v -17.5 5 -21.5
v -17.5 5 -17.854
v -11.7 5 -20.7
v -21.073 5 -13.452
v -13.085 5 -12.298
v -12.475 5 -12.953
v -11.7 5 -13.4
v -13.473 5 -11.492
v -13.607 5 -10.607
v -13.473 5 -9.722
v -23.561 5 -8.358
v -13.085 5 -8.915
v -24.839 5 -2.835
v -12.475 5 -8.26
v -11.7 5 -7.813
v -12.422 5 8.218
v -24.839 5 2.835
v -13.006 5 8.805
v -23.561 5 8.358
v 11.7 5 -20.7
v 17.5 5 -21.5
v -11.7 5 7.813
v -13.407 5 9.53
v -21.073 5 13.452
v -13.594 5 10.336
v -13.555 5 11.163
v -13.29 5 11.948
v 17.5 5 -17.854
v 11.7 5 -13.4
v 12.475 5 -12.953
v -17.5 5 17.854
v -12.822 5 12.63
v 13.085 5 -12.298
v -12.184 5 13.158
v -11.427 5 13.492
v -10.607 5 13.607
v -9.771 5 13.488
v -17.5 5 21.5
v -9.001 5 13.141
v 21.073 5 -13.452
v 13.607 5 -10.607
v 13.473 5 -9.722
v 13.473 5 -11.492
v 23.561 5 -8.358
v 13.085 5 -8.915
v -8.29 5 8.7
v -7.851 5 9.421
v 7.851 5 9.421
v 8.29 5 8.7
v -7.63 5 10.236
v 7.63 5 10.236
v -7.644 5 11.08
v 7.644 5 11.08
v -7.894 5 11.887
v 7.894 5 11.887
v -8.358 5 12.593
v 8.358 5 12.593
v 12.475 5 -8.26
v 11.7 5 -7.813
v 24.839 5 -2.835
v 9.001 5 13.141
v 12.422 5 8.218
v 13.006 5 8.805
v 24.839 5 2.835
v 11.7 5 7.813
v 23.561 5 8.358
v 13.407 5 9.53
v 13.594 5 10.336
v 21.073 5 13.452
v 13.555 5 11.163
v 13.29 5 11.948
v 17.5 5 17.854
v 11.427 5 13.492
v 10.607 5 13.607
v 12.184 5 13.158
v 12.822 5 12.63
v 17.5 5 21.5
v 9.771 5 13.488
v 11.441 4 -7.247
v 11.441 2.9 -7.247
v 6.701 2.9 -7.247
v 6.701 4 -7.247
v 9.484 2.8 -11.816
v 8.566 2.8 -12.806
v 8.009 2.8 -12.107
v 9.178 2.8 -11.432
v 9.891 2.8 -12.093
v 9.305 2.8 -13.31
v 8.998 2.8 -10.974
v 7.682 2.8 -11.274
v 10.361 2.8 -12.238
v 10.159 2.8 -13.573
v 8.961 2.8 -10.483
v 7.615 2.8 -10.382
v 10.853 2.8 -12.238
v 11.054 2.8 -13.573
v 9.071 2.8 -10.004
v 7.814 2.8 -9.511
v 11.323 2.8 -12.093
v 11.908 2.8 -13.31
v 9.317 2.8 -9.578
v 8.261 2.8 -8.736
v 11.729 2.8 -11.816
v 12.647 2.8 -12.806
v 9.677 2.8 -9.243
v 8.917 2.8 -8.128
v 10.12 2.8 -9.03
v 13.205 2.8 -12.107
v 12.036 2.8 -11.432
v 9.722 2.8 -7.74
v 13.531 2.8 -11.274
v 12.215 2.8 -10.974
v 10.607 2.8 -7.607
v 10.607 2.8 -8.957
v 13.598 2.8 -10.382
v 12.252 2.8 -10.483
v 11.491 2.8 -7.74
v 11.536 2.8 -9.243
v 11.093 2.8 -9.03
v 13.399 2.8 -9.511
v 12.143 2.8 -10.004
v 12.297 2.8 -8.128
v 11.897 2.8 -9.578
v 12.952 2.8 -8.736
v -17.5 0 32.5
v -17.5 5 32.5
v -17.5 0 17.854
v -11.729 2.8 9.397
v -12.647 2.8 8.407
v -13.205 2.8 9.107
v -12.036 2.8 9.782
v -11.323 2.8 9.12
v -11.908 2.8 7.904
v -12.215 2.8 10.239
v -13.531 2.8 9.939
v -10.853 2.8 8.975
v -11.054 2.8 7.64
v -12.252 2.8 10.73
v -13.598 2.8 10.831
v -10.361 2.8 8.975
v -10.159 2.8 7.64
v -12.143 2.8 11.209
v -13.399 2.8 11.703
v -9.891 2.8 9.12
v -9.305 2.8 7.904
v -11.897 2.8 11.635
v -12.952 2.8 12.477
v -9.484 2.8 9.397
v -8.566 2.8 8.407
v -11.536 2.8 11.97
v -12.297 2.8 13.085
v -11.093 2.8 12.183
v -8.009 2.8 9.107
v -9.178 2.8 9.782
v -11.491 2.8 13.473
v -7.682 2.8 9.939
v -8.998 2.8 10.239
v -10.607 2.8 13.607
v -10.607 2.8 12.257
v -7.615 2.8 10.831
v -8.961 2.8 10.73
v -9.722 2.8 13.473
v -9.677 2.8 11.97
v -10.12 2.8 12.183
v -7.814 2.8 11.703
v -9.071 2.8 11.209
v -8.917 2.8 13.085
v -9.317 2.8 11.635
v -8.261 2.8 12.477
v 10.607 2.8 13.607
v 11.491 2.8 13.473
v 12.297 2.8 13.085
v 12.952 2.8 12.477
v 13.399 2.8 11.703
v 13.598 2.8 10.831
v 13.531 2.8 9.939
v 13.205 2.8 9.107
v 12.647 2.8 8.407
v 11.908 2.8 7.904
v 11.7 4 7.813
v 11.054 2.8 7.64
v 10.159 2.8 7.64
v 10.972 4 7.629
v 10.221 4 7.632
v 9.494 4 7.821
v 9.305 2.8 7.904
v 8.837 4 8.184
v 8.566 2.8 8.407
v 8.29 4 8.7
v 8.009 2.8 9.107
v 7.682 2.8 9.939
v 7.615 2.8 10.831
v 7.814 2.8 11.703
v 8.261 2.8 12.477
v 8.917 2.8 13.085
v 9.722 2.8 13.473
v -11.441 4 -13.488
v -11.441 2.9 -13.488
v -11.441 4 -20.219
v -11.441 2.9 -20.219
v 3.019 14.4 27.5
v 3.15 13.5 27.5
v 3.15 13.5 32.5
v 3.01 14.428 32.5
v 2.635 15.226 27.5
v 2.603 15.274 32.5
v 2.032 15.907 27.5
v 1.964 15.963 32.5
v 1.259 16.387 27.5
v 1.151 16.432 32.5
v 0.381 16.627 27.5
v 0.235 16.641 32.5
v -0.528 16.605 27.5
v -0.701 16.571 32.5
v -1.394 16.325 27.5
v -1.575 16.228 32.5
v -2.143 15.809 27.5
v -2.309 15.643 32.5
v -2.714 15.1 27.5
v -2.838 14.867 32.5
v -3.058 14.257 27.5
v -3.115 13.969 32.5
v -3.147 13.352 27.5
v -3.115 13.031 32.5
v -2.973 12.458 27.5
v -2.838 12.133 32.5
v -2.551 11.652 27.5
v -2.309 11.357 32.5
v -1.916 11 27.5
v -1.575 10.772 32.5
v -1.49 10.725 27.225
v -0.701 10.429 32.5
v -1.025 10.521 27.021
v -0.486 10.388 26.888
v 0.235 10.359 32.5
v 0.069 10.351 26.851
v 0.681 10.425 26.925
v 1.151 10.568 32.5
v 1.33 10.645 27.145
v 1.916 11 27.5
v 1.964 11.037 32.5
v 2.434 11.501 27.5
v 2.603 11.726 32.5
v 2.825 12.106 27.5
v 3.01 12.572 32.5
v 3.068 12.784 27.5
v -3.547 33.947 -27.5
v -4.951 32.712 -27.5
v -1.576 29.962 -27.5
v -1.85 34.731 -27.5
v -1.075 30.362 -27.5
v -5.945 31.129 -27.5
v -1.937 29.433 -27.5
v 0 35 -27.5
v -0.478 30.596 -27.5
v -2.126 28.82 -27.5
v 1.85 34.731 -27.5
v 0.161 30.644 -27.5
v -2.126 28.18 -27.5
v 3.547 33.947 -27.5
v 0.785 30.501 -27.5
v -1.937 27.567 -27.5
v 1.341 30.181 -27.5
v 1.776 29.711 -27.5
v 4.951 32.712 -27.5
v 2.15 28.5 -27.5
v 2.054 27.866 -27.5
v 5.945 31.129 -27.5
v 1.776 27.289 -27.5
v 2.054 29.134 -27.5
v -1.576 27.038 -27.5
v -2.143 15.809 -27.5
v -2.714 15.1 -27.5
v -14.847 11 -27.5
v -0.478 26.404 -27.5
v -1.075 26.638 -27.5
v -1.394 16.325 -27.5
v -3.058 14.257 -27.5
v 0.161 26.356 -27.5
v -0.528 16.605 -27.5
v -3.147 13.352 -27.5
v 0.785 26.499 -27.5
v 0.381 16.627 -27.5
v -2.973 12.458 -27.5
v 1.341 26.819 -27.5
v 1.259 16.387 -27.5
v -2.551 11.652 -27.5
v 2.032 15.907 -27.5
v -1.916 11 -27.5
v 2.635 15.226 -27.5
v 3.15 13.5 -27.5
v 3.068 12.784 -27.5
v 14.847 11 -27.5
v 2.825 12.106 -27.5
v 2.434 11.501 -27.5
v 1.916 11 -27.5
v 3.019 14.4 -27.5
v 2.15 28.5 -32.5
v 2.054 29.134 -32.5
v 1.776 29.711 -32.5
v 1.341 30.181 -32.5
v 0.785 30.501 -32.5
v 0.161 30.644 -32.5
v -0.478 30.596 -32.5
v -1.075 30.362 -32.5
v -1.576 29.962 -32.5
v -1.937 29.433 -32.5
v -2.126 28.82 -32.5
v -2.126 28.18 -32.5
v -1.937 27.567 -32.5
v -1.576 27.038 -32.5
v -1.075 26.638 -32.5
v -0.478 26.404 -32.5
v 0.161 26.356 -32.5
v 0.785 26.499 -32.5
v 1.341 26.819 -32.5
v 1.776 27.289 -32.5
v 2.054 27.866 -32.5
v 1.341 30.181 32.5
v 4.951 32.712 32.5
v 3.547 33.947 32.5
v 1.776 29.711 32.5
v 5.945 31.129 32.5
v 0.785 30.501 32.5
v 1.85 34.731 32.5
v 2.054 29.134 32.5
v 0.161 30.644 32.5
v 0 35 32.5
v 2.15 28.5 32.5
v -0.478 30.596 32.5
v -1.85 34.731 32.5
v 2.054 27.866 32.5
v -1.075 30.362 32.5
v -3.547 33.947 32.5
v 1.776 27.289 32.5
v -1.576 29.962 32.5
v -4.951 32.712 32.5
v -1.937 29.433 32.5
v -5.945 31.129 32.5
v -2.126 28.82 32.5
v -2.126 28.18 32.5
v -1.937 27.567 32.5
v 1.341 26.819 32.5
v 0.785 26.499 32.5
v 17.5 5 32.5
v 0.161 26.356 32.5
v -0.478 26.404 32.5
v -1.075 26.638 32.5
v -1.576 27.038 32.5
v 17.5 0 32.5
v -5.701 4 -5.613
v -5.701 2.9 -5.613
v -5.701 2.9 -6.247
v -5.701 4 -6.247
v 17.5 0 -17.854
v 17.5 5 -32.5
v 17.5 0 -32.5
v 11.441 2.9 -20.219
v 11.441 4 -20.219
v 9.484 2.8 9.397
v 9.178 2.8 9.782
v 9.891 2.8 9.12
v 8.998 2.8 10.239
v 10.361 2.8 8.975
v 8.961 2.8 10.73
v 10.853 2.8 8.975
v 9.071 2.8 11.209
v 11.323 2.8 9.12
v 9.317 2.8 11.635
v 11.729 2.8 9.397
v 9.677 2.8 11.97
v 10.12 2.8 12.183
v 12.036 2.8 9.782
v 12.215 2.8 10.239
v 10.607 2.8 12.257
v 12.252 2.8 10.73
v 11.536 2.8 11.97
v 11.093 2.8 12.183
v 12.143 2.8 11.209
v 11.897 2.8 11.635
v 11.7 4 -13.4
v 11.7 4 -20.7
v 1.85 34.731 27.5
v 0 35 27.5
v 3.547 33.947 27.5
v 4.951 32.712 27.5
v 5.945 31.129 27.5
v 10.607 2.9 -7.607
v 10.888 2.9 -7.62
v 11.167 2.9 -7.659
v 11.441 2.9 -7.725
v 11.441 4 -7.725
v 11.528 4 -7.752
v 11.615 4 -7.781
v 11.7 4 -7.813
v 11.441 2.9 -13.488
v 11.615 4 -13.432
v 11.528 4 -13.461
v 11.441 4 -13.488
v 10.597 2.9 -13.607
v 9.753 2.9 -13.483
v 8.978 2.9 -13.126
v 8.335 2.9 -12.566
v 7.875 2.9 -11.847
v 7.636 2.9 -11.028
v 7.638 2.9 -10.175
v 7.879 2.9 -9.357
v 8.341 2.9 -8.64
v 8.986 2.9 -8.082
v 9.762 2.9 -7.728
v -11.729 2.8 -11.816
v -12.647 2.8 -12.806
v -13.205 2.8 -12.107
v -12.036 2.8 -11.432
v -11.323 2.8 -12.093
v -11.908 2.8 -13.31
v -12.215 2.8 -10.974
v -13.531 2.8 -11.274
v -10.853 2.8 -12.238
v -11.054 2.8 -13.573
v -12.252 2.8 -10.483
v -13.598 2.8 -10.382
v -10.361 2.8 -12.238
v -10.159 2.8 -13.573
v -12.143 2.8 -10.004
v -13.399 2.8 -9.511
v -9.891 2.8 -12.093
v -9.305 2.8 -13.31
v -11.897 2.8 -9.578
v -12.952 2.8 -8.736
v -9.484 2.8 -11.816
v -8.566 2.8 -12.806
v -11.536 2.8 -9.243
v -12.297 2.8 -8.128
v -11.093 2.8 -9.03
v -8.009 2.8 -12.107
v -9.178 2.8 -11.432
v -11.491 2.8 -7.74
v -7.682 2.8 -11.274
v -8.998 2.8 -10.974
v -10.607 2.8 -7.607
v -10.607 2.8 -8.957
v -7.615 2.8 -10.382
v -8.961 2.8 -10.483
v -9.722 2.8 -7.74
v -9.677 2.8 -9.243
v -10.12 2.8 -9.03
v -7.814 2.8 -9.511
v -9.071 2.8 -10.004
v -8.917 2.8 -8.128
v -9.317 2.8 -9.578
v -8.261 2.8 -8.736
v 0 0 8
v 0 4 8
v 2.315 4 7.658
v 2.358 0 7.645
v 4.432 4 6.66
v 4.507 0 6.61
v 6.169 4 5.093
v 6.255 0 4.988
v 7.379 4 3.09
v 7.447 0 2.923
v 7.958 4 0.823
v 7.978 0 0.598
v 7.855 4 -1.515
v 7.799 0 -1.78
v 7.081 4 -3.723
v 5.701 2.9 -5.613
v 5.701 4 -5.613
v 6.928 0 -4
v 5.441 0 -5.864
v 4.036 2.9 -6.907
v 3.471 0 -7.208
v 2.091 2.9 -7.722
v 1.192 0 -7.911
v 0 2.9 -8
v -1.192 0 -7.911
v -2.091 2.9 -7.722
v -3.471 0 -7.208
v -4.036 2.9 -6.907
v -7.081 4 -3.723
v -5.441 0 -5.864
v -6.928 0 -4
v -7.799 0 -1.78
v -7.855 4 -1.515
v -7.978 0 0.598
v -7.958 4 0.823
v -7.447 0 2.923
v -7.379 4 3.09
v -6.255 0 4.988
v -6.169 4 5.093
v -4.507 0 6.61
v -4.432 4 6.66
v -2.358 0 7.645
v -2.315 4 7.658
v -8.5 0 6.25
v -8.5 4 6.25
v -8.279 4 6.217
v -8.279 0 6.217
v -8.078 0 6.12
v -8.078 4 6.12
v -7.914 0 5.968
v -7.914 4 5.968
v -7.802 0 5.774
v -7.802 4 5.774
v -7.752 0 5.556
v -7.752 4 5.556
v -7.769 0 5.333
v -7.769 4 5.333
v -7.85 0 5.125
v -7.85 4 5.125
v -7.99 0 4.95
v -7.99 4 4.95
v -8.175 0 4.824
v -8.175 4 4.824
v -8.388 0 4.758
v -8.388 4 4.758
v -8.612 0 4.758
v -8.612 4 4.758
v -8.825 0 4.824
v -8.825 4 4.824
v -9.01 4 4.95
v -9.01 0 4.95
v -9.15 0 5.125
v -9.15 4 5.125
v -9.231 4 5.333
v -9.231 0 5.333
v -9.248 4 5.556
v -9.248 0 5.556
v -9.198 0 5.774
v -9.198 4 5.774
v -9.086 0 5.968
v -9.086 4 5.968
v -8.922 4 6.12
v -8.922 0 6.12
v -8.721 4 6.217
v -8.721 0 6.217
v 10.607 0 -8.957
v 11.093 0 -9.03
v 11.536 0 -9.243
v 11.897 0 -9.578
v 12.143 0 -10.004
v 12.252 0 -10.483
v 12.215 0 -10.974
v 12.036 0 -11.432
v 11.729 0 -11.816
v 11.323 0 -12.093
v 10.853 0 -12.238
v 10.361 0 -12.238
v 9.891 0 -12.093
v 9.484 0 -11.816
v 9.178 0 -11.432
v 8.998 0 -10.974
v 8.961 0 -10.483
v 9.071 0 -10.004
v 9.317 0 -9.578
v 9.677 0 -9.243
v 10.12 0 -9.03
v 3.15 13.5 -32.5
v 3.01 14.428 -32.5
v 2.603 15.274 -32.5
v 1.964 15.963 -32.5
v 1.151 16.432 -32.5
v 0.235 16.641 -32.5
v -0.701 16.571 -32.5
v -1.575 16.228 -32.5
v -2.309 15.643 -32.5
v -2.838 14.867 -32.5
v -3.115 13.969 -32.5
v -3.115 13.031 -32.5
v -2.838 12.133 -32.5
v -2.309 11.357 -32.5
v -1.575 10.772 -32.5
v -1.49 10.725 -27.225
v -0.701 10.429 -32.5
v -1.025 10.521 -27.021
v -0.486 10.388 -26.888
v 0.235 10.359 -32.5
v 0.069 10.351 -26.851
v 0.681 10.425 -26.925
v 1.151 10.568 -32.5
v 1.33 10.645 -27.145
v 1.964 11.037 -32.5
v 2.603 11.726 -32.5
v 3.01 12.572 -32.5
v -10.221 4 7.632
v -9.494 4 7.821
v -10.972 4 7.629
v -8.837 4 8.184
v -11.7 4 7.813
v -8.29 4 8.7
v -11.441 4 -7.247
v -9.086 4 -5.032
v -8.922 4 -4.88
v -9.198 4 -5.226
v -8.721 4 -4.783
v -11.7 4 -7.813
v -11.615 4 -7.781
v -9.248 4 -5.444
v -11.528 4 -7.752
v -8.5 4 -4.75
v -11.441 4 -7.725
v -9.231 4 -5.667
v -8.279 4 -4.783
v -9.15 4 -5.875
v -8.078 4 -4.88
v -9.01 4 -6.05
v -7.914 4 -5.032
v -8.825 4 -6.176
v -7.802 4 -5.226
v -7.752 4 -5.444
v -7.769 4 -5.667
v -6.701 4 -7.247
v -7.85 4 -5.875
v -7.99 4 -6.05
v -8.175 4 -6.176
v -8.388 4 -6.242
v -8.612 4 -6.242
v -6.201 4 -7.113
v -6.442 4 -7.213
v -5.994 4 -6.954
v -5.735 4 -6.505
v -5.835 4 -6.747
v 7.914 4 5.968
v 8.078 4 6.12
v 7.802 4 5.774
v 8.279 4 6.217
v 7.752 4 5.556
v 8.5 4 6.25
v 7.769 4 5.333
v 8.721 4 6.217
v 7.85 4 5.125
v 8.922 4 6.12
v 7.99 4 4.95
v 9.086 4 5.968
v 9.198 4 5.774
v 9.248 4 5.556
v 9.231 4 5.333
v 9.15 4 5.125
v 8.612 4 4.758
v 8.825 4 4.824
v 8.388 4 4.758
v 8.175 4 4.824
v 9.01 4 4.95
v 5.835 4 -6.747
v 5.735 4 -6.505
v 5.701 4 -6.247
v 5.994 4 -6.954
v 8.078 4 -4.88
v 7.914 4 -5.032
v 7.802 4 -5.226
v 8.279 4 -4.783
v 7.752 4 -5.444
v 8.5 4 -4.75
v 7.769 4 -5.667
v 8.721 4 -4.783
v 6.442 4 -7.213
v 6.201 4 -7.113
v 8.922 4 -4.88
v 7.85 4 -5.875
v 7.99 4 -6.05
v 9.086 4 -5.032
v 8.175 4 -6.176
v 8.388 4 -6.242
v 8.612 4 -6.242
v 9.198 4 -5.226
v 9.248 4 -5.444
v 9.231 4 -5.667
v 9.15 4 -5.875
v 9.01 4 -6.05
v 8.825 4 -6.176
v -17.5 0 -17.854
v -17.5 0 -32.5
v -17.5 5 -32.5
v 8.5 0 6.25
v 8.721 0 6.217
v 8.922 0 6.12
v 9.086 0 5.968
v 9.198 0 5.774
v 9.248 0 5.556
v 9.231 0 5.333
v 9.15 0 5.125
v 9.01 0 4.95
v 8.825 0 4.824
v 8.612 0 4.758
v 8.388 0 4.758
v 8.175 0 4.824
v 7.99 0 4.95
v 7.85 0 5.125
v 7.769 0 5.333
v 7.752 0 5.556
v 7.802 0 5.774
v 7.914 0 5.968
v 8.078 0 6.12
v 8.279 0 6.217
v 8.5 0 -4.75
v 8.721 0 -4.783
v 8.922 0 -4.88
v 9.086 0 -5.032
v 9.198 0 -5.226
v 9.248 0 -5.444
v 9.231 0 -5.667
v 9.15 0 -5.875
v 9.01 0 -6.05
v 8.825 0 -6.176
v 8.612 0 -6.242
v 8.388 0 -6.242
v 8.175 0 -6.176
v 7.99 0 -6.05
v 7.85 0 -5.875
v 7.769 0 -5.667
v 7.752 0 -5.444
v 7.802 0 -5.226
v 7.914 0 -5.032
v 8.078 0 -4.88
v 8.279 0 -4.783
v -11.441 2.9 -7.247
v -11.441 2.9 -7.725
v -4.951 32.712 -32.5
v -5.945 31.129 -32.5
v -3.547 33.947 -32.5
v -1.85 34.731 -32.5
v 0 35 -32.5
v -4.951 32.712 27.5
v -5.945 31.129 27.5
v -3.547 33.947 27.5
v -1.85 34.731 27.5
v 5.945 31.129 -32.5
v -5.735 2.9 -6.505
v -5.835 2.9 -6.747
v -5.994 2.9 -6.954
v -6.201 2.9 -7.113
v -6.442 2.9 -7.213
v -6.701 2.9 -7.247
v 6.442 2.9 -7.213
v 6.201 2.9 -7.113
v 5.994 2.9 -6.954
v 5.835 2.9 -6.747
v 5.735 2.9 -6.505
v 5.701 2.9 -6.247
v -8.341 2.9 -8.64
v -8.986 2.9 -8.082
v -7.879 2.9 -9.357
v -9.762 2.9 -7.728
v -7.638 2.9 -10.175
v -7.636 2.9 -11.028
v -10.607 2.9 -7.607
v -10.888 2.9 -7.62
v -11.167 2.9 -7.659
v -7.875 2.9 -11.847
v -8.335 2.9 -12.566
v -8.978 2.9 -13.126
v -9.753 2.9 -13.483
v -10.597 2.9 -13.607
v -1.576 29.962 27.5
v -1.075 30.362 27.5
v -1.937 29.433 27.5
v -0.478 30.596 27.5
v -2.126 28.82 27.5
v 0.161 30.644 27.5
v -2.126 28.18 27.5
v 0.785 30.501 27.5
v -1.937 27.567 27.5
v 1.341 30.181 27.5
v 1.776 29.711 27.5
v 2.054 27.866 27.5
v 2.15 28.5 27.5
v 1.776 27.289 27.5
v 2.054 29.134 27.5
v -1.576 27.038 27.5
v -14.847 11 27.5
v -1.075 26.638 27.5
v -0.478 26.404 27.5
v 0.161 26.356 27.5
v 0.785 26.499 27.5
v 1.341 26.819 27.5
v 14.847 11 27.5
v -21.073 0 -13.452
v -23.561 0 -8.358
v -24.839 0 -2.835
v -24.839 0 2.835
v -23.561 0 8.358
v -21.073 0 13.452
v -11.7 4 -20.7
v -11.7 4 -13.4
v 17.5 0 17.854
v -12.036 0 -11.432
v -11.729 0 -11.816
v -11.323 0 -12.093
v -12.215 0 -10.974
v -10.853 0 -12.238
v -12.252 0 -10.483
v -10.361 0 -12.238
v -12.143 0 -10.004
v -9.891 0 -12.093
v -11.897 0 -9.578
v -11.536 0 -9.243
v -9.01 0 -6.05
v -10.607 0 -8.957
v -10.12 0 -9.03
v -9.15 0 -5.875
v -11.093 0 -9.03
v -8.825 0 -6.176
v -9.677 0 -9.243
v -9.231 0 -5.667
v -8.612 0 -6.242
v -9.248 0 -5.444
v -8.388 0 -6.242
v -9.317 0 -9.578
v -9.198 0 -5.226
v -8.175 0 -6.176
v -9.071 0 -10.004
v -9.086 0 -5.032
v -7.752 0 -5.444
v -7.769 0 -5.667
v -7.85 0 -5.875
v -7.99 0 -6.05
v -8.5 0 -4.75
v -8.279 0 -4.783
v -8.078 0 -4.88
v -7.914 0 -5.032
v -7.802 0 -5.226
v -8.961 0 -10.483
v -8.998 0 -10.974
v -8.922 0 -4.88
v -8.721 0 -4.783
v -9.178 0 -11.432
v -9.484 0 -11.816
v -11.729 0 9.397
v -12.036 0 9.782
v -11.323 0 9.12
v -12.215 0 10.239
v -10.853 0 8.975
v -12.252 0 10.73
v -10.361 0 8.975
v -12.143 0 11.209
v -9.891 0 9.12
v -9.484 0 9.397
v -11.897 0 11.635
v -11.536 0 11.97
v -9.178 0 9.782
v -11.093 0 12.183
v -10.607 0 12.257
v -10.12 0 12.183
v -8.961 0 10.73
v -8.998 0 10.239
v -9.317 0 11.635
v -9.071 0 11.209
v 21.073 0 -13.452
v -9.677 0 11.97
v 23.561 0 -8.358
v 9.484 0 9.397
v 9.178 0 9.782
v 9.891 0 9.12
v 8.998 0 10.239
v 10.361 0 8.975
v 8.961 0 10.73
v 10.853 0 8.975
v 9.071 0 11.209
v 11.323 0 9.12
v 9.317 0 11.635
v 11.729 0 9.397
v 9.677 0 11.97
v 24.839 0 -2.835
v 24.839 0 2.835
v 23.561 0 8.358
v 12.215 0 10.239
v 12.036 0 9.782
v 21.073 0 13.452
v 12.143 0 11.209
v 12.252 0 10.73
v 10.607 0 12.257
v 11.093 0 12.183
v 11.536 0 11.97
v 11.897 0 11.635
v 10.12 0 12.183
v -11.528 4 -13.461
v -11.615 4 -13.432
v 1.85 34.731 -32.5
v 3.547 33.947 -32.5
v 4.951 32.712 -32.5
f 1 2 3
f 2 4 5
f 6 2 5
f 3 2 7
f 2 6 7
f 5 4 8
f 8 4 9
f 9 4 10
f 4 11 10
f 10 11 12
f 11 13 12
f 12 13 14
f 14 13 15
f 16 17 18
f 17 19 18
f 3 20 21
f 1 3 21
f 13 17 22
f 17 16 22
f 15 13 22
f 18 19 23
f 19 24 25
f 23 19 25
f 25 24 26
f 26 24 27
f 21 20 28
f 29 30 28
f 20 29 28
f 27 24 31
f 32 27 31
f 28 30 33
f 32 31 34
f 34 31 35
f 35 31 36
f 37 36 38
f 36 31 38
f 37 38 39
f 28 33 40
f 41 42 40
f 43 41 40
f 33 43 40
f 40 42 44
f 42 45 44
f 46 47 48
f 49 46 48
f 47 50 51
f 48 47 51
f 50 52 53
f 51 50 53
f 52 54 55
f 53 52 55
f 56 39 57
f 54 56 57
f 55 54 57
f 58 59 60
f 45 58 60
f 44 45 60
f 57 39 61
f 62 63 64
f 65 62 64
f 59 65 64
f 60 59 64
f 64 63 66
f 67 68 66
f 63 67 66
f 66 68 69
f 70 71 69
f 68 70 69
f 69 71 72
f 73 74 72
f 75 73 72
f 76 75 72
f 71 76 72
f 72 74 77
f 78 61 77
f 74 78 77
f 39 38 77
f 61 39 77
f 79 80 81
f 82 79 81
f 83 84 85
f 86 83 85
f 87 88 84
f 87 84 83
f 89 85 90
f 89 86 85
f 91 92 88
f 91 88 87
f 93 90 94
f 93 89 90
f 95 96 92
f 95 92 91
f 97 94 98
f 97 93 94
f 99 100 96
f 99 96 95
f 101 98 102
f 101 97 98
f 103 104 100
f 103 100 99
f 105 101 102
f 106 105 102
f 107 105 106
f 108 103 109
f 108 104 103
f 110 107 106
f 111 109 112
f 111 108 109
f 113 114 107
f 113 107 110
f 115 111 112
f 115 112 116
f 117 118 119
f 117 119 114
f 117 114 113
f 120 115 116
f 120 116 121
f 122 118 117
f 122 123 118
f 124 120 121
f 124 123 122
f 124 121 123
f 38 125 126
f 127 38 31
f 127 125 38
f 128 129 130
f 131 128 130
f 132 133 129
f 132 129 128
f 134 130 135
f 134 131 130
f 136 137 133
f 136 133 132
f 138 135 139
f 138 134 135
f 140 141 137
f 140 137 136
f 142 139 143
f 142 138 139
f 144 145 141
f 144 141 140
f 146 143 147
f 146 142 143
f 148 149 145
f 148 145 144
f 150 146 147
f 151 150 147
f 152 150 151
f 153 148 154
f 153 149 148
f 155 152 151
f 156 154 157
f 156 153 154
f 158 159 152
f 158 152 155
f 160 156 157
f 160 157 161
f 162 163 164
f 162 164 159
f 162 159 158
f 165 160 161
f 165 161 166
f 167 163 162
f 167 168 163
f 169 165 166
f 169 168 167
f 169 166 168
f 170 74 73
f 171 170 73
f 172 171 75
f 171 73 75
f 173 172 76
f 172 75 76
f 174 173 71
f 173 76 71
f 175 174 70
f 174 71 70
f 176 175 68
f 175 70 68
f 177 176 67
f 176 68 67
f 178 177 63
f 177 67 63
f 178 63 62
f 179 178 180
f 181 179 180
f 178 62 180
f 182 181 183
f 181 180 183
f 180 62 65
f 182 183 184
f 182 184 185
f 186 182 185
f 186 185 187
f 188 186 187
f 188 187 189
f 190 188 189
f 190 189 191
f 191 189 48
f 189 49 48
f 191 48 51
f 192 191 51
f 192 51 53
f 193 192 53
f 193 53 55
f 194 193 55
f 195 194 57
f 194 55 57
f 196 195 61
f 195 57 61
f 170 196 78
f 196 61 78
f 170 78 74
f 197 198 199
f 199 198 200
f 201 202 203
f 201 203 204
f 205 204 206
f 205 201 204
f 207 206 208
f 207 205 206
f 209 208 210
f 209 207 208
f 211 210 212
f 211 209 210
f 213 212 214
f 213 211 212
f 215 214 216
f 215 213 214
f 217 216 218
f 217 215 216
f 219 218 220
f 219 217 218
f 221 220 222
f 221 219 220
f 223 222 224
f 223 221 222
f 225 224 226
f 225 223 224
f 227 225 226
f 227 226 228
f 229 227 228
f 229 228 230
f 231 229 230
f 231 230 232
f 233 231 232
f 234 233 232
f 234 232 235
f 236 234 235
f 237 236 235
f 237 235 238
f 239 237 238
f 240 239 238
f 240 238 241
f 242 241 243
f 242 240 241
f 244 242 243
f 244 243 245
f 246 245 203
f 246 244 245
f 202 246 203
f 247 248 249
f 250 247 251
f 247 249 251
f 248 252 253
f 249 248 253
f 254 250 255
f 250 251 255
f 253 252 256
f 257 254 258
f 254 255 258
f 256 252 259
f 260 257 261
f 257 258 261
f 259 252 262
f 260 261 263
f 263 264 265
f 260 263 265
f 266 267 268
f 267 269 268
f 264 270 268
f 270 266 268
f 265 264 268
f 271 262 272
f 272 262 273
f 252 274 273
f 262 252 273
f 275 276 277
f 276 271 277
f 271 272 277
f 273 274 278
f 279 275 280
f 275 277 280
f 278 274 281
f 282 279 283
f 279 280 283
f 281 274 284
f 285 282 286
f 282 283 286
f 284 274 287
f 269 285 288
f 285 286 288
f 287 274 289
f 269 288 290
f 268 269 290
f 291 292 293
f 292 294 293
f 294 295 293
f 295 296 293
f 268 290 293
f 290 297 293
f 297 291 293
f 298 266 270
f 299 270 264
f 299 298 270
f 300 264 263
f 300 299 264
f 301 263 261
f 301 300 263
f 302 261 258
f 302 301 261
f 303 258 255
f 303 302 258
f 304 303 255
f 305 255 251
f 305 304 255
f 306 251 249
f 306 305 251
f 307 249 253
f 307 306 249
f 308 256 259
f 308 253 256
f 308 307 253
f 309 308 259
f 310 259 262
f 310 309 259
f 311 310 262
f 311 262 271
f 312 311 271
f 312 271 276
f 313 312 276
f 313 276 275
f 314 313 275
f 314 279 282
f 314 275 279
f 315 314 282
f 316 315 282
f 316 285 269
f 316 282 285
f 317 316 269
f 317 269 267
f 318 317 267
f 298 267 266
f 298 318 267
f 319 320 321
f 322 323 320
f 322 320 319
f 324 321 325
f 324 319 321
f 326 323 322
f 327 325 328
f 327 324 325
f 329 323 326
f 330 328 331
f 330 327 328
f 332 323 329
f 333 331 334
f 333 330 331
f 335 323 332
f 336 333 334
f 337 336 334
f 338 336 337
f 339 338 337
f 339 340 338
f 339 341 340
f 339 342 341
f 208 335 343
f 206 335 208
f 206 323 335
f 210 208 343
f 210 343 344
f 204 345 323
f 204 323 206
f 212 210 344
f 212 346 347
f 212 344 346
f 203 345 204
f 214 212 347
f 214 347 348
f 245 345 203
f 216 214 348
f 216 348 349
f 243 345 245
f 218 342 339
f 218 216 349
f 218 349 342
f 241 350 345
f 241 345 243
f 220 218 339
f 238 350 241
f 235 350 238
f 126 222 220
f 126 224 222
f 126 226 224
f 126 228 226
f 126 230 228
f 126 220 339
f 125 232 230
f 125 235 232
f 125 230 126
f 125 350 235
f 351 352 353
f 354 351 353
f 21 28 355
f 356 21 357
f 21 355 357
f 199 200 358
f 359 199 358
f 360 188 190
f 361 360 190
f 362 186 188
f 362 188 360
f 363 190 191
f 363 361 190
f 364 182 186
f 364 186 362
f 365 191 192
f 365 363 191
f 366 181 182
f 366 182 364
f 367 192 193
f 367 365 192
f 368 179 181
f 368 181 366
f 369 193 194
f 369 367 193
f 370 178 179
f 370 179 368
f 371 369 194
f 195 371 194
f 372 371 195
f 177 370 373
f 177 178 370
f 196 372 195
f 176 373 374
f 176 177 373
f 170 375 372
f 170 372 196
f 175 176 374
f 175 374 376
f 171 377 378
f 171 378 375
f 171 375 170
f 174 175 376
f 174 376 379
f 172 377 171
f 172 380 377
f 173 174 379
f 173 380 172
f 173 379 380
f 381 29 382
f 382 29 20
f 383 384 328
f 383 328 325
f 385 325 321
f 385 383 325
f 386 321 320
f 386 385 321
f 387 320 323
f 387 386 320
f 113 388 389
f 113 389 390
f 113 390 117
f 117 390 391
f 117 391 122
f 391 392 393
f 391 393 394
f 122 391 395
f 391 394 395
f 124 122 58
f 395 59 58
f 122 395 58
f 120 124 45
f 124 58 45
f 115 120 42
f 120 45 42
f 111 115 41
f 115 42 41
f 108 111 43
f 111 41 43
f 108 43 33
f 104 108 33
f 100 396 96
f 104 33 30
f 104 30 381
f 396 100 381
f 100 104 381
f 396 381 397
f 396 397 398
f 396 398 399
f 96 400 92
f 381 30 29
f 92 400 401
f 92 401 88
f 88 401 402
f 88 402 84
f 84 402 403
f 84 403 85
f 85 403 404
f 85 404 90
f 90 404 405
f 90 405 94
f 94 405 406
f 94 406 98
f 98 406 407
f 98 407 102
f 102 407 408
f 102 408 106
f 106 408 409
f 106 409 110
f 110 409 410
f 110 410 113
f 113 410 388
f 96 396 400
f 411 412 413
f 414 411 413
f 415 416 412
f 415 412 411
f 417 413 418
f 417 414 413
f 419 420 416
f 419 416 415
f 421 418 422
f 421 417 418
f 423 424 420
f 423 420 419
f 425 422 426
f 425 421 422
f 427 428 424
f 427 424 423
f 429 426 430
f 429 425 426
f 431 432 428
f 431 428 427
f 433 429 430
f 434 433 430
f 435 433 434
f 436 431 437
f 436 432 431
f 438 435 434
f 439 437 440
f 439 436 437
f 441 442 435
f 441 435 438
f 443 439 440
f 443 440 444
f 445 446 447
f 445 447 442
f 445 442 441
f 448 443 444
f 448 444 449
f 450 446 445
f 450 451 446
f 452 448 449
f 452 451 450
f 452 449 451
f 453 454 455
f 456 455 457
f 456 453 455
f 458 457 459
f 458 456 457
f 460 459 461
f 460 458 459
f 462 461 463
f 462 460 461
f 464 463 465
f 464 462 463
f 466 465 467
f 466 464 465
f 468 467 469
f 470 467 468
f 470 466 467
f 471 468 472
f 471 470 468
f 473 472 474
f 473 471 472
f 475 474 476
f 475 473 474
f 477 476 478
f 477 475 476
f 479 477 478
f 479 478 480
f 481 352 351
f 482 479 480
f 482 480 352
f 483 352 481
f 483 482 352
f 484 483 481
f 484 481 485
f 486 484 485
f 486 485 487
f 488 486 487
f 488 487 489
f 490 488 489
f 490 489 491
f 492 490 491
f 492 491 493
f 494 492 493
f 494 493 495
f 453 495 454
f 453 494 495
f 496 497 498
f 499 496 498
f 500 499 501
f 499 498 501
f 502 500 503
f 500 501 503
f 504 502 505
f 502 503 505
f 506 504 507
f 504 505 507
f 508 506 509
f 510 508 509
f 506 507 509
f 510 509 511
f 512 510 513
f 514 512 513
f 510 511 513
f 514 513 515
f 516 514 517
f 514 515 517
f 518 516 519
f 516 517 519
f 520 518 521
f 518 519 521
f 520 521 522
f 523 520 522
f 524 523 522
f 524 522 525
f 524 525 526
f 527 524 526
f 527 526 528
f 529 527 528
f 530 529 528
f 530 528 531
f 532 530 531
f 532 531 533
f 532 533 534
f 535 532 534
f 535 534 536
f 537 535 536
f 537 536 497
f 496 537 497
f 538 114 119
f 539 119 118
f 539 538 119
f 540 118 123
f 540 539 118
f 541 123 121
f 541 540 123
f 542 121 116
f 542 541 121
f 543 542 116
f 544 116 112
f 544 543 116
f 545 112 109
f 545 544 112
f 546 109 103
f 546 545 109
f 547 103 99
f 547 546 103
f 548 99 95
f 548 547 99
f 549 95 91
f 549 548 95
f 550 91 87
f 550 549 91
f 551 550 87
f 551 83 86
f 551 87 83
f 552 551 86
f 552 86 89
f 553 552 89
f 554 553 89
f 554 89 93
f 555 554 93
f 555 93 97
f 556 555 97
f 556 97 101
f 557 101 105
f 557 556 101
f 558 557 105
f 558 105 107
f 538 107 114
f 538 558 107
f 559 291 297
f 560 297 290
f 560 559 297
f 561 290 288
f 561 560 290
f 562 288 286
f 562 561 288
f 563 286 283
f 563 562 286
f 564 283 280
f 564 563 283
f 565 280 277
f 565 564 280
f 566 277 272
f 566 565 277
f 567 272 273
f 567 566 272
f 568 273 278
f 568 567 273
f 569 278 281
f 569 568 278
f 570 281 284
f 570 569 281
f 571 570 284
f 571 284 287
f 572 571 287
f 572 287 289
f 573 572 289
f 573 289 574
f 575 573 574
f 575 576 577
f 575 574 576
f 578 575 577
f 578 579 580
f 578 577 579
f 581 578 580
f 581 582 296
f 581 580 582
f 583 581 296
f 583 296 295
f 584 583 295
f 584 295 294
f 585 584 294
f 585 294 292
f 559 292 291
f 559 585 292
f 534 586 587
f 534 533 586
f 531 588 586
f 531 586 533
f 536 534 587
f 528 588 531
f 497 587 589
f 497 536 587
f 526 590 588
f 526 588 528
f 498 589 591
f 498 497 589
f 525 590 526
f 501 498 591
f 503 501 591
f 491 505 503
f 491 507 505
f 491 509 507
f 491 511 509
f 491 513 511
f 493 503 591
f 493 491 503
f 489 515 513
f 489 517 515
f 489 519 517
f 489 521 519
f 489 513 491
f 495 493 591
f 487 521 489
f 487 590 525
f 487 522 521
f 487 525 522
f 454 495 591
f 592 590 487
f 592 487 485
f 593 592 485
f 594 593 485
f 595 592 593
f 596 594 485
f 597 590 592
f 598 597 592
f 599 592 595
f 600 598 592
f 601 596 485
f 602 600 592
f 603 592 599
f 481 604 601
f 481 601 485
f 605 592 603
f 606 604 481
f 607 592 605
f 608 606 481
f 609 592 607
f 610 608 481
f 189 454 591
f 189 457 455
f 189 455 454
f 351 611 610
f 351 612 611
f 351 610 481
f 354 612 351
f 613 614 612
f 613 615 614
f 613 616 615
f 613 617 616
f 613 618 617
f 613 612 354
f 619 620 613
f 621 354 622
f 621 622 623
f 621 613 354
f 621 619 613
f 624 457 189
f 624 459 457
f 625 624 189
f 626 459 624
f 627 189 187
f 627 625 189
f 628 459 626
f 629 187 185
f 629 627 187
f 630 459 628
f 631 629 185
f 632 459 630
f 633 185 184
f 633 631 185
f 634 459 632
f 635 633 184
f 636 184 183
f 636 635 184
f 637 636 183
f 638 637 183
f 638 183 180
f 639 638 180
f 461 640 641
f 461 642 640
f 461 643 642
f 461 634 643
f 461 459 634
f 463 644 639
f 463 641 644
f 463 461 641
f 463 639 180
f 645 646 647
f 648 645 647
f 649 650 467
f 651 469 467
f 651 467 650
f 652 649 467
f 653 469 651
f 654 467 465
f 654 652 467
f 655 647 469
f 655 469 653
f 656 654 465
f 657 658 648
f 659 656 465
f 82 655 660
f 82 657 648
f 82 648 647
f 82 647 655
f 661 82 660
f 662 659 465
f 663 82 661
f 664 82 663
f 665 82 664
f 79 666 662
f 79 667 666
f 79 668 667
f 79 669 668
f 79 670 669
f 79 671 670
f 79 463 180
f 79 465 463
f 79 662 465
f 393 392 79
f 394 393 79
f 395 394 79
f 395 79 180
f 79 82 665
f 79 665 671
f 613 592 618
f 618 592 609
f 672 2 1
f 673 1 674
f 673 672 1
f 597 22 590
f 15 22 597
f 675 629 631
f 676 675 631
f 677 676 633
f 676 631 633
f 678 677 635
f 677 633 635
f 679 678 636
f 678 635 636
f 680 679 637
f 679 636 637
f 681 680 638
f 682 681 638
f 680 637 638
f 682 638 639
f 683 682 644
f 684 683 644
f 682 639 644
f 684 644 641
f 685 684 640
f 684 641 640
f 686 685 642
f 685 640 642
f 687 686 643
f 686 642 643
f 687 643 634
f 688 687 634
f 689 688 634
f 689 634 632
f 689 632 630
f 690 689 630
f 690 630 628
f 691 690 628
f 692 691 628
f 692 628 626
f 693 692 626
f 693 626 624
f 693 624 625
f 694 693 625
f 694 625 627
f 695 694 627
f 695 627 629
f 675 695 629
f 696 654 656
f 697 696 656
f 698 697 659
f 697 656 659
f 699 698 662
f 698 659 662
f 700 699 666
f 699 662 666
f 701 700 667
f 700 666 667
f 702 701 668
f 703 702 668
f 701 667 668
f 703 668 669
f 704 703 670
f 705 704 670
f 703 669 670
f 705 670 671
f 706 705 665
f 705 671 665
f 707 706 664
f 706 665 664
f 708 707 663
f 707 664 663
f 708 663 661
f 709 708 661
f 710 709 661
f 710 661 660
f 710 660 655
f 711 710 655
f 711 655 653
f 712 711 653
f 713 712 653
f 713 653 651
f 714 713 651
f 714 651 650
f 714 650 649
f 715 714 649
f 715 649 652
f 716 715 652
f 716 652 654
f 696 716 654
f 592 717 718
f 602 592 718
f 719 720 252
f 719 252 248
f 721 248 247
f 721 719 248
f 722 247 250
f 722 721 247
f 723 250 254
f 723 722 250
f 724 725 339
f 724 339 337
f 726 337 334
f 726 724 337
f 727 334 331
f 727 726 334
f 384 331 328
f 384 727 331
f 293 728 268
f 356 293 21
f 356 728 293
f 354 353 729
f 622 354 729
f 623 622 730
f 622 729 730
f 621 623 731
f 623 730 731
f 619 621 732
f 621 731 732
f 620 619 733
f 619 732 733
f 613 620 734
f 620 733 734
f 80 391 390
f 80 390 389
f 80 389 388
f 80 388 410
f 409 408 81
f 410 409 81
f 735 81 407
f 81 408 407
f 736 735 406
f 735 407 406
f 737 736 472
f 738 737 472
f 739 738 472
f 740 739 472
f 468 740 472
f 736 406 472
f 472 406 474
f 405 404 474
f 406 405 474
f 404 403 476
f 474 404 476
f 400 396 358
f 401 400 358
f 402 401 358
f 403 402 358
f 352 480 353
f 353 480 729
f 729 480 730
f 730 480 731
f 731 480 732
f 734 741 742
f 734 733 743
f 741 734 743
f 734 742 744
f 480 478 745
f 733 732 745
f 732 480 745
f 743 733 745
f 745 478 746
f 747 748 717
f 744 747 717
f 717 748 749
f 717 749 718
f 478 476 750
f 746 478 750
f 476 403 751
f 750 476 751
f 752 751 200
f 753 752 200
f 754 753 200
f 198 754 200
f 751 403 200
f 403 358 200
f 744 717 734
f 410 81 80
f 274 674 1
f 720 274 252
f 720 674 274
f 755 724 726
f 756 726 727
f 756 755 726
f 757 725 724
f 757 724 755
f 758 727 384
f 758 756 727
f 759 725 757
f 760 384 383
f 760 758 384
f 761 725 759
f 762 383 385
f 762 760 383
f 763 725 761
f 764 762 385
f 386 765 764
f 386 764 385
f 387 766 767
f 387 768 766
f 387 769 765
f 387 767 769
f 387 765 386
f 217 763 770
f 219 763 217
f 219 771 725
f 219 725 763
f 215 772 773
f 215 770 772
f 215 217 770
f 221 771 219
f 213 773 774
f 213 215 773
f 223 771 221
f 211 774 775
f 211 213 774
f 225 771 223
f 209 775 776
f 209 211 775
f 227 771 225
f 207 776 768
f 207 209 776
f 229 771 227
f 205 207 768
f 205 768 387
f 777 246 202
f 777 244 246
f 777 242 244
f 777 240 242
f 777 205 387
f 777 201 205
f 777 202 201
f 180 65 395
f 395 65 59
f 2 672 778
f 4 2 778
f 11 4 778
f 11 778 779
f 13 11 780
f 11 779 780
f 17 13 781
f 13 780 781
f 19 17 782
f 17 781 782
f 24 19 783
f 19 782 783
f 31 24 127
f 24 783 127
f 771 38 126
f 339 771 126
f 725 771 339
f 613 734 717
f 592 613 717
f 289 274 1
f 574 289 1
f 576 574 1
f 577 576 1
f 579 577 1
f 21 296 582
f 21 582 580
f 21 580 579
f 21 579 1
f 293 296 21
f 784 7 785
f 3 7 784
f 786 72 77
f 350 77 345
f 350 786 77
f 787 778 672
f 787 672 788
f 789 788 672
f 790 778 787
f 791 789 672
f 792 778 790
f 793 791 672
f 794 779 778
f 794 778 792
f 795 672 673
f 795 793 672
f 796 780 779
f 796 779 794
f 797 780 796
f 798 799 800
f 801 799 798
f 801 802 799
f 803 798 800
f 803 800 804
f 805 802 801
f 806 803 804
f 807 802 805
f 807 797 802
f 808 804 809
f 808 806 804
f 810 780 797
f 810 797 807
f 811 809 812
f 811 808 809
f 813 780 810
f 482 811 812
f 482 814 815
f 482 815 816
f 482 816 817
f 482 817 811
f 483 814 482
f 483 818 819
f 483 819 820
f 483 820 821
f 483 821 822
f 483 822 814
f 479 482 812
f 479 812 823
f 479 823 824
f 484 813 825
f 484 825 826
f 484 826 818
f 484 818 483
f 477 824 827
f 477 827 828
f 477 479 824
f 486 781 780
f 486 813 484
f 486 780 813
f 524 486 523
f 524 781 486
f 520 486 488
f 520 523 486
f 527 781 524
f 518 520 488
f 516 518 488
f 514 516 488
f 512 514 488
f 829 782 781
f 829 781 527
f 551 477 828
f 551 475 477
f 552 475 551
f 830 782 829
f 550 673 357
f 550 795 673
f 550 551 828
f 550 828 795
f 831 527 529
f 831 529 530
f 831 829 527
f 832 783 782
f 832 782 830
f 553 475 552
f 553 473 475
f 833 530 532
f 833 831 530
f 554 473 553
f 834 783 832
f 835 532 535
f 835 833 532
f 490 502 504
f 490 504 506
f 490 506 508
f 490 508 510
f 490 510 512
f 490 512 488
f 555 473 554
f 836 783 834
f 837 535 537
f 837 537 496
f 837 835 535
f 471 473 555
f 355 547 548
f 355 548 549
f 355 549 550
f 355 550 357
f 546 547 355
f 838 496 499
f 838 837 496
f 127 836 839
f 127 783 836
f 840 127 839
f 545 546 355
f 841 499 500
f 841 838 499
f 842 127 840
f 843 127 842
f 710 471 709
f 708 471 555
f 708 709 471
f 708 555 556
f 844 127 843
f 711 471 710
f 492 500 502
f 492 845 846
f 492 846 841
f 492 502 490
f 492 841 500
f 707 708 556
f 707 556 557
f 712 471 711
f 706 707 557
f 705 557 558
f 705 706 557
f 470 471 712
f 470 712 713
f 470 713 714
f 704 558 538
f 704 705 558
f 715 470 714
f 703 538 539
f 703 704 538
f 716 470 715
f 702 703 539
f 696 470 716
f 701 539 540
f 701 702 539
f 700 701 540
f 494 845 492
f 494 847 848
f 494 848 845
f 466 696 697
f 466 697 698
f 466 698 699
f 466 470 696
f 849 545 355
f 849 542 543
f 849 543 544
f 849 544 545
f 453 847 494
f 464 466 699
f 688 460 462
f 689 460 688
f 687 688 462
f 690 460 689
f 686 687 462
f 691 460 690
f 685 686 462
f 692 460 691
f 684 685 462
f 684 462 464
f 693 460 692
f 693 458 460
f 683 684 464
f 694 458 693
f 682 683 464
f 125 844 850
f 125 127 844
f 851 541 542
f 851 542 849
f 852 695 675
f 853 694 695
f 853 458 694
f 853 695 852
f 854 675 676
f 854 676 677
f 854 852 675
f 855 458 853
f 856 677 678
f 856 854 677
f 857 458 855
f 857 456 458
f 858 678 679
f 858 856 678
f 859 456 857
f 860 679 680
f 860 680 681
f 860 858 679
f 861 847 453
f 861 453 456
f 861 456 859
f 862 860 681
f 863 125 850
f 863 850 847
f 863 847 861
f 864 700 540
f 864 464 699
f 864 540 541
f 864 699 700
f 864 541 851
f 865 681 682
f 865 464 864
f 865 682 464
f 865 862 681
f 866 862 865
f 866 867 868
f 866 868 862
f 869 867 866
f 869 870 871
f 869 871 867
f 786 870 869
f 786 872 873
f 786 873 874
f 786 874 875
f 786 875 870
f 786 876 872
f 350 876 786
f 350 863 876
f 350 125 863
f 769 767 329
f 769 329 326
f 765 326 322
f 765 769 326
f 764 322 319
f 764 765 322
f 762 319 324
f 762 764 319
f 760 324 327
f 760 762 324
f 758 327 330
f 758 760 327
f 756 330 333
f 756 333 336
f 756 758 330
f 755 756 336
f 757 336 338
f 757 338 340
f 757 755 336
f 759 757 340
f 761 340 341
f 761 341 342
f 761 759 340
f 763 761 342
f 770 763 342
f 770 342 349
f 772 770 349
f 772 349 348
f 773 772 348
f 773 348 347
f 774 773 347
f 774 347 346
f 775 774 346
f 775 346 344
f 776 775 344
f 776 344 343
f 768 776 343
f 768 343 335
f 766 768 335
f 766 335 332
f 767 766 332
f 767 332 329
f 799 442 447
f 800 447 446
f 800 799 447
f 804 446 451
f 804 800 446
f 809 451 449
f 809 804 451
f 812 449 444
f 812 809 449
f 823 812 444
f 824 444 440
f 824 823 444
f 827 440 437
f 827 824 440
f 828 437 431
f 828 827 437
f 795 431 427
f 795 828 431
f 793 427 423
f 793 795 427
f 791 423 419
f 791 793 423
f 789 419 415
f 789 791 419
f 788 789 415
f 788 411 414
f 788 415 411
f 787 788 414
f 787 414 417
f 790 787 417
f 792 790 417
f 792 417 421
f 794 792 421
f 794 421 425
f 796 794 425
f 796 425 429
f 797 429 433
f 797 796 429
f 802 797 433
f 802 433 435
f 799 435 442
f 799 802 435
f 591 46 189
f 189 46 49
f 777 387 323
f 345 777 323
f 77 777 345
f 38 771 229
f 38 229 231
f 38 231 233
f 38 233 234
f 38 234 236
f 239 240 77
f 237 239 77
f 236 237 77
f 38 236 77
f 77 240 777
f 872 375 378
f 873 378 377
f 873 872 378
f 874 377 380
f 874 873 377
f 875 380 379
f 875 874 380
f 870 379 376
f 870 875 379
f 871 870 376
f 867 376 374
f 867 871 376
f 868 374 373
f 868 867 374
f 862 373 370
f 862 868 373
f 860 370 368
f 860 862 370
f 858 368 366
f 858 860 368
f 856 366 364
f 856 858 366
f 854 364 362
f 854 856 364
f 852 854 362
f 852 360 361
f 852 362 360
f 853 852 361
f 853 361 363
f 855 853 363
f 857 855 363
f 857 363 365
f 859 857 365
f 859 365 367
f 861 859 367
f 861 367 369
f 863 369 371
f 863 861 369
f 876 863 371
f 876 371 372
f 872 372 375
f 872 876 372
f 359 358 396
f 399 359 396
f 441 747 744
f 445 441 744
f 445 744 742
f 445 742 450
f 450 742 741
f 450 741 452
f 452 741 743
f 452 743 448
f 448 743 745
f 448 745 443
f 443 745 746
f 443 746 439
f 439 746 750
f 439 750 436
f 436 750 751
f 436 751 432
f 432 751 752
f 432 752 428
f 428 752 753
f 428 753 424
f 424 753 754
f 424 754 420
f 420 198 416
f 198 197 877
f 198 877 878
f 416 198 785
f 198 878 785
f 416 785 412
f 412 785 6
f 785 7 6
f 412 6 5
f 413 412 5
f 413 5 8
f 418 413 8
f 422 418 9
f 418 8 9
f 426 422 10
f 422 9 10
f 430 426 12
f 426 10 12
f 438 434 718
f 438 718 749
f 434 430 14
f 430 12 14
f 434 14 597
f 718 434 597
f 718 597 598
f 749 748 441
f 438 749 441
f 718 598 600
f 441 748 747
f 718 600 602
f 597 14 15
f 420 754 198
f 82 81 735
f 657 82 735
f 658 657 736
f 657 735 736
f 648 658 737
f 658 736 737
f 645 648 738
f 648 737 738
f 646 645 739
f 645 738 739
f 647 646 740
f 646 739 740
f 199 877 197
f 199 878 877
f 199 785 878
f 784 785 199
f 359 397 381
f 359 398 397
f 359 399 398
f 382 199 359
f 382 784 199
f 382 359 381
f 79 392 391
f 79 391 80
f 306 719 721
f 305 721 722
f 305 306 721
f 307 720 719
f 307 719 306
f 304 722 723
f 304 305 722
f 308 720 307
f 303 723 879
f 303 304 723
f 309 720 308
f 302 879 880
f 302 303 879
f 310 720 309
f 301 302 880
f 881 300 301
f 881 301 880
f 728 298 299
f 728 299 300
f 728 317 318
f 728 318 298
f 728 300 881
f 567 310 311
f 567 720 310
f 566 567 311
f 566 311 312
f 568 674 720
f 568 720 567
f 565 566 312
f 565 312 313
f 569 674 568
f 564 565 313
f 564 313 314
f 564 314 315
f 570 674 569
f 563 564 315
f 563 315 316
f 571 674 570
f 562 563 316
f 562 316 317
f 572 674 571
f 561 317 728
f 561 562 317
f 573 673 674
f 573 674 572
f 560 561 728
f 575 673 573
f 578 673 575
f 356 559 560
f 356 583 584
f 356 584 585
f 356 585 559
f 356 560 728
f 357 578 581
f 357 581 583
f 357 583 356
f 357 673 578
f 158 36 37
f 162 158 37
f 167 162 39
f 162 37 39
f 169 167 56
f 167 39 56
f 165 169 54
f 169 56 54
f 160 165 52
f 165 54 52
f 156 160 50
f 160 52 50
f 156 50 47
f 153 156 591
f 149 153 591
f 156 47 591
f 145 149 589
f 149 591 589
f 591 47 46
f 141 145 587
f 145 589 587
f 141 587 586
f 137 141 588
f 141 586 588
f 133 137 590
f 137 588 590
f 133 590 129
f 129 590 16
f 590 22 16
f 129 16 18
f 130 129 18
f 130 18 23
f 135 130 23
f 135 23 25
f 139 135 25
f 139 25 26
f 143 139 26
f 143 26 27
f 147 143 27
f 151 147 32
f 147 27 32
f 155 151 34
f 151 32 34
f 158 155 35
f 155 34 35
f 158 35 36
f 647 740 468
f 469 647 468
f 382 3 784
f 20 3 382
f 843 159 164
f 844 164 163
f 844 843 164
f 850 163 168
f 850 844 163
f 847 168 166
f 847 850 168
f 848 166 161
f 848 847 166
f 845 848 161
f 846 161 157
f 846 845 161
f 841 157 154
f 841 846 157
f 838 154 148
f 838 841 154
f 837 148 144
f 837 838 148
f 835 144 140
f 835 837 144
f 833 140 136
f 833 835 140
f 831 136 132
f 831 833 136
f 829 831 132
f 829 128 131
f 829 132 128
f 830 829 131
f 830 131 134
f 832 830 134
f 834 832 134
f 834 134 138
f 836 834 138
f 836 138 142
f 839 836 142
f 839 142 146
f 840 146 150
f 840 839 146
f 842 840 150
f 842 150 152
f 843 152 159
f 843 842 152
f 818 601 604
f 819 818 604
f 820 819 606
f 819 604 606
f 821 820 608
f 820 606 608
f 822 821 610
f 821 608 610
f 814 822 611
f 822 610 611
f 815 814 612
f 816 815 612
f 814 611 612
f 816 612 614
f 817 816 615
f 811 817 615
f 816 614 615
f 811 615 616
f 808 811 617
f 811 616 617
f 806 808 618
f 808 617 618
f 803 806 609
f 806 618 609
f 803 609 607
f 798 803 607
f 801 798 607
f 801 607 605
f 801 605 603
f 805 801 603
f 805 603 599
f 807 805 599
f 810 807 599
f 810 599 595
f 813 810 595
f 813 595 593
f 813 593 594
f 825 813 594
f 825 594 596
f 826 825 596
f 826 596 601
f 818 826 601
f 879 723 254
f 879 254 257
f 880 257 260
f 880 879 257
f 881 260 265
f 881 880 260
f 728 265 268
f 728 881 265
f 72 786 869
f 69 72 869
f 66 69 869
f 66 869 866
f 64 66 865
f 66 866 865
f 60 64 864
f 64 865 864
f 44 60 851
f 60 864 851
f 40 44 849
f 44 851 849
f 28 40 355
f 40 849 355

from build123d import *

# Parameters (mm, degrees)
SKETCH_1_R                = 25
SKETCH_1_R_2              = 8
SKETCH_1_R_3              = 1.65
EXTRUDE_1_DEPTH           = 5
SKETCH_5_W                = 23.4
SKETCH_5_H                = 29.4
CUT_EXTRUDE_1_DEPTH       = 1
SKETCH_6_R                = 3
CUT_EXTRUDE_2_DEPTH       = 2.2
CUT_EXTRUDE_3_REACH       = 37.581
SKETCH_9_R                = 0.75
CUT_EXTRUDE_START         = -1.1
CUT_EXTRUDE_4_DEPTH       = 1.1
EXTRUDE_3_DEPTH           = 5
SKETCH_13_W               = 35
SKETCH_13_H               = 5
EXTRUDE_4_DEPTH           = 30
CHAMFER_1_SIZE            = 6
CUT_EXTRUDE_START_2       = -65
CUT_EXTRUDE_5_OUTLINE_R   = 2.15
CUT_EXTRUDE_5_OUTLINE_R_2 = 3.15
CUT_EXTRUDE_5_DEPTH       = 65


# Read off the part's stored shape, not the designer's step: 切除-拉伸5
with BuildPart() as part:
    # 草图1 → 凸台-拉伸1 (new body)
    with BuildSketch(Plane(origin=(0, 0, 0), x_dir=(1, 0, 0), z_dir=(0, 1, 0))):
        with Locations(Location((0, 0, 0), (0, 0, 270))):
            Circle(SKETCH_1_R)
        with Locations(Location((0, 0, 0), (0, 0, 270))):
            Circle(SKETCH_1_R_2, mode=Mode.SUBTRACT)
        with Locations(Location((10.606601718, 10.606601718, 0), (0, 0, 270))):
            Circle(SKETCH_1_R_3, mode=Mode.SUBTRACT)
        with Locations(Location((-10.606601718, 10.606601718, 0), (0, 0, 270))):
            Circle(SKETCH_1_R_3, mode=Mode.SUBTRACT)
        with Locations(Location((-10.606601718, -10.606601718, 0), (0, 0, 270))):
            Circle(SKETCH_1_R_3, mode=Mode.SUBTRACT)
        with Locations(Location((10.606601718, -10.606601718, 0), (0, 0, 270))):
            Circle(SKETCH_1_R_3, mode=Mode.SUBTRACT)
    extrude(amount=EXTRUDE_1_DEPTH)

    # 草图5 → 切除-拉伸1 (cut)
    with BuildSketch(Plane(origin=(0, 5, 0), x_dir=(1, 0, 0), z_dir=(0, 1, 0))):
        with Locations((0, 6)):
            Rectangle(SKETCH_5_W, SKETCH_5_H)
    extrude(amount=-CUT_EXTRUDE_1_DEPTH, mode=Mode.SUBTRACT)

    # 草图6 → 切除-拉伸2 (cut)
    with BuildSketch(Plane(origin=(0, 5, 0), x_dir=(1, 0, 0), z_dir=(0, 1, 0))):
        with Locations(Location((-10.606601718, 10.606601718, 0), (0, 0, 270))):
            Circle(SKETCH_6_R)
        with Locations(Location((10.606601718, 10.606601718, 0), (0, 0, 270))):
            Circle(SKETCH_6_R)
        with Locations(Location((10.606601718, -10.606601718, 0), (0, 0, 270))):
            Circle(SKETCH_6_R)
        with Locations(Location((-10.606601718, -10.606601718, 0), (0, 0, 270))):
            Circle(SKETCH_6_R)
    extrude(amount=-CUT_EXTRUDE_2_DEPTH, mode=Mode.SUBTRACT)

    # 草图9 → 切除-拉伸3 (cut, up to next)
    with BuildSketch(Plane(origin=(0, 4, 0), x_dir=(1, 0, 0), z_dir=(0, 1, 0)), mode=Mode.PRIVATE) as cut_extrude_3_sk1:
        with Locations(Location((-8.5, 5.5, 0), (0, 0, 270))):
            Circle(SKETCH_9_R)
    cut_extrude_3_tool1 = extrude(cut_extrude_3_sk1.sketch, amount=-CUT_EXTRUDE_3_REACH, mode=Mode.PRIVATE) & part.part
    # 草图9 → 切除-拉伸3 (cut, up to next)
    with BuildSketch(Plane(origin=(0, 4, 0), x_dir=(1, 0, 0), z_dir=(0, 1, 0)), mode=Mode.PRIVATE) as cut_extrude_3_sk2:
        with Locations(Location((8.5, 5.5, 0), (0, 0, 270))):
            Circle(SKETCH_9_R)
    cut_extrude_3_tool2 = extrude(cut_extrude_3_sk2.sketch, amount=-CUT_EXTRUDE_3_REACH, mode=Mode.PRIVATE) & part.part
    # 草图9 → 切除-拉伸3 (cut, up to next)
    with BuildSketch(Plane(origin=(0, 4, 0), x_dir=(1, 0, 0), z_dir=(0, 1, 0)), mode=Mode.PRIVATE) as cut_extrude_3_sk3:
        with Locations(Location((8.5, -5.5, 0), (0, 0, 270))):
            Circle(SKETCH_9_R)
    cut_extrude_3_tool3 = extrude(cut_extrude_3_sk3.sketch, amount=-CUT_EXTRUDE_3_REACH, mode=Mode.PRIVATE) & part.part
    # 草图9 → 切除-拉伸3 (cut, up to next)
    with BuildSketch(Plane(origin=(0, 4, 0), x_dir=(1, 0, 0), z_dir=(0, 1, 0)), mode=Mode.PRIVATE) as cut_extrude_3_sk4:
        with Locations(Location((-8.5, -5.5, 0), (0, 0, 270))):
            Circle(SKETCH_9_R)
    cut_extrude_3_tool4 = extrude(cut_extrude_3_sk4.sketch, amount=-CUT_EXTRUDE_3_REACH, mode=Mode.PRIVATE) & part.part
    add(cut_extrude_3_tool1.solids().sort_by_distance((-8.5, 4, -5.5))[0], mode=Mode.SUBTRACT)
    add(cut_extrude_3_tool2.solids().sort_by_distance((8.5, 4, -5.5))[0], mode=Mode.SUBTRACT)
    add(cut_extrude_3_tool3.solids().sort_by_distance((8.5, 4, 5.5))[0], mode=Mode.SUBTRACT)
    add(cut_extrude_3_tool4.solids().sort_by_distance((-8.5, 4, 5.5))[0], mode=Mode.SUBTRACT)

    # 草图10 → 切除-拉伸4 (cut)
    with BuildSketch(Plane(origin=(0, 4, 0), x_dir=(1, 0, 0), z_dir=(0, 1, 0)).offset(CUT_EXTRUDE_START)):
        with BuildLine():
            Line((-5.700788223, 5.612576381), (-5.700788223, 6.246626792))
            ThreePointArc((-5.700788223, 6.246626792), (-5.993681442, 6.953733574), (-6.700788223, 7.246626792))
            Line((-6.700788223, 7.246626792), (-11.441421376, 7.246626792))
            Line((-11.441421376, 7.246626792), (-11.441421376, 20.219080974))
            Line((-11.441421376, 20.219080974), (11.441421376, 20.219080974))
            Line((11.441421376, 20.219080974), (11.441421376, 7.246626792))
            Line((11.441421376, 7.246626792), (6.700788223, 7.246626792))
            ThreePointArc((6.700788223, 7.246626792), (5.993681442, 6.953733574), (5.700788223, 6.246626792))
            Line((5.700788223, 6.246626792), (5.700788223, 5.612576381))
            ThreePointArc((5.700788223, 5.612576381), (0, 8), (-5.700788223, 5.612576381))
        make_face()
    extrude(amount=CUT_EXTRUDE_4_DEPTH, mode=Mode.SUBTRACT)

    # 草图12 → 凸台-拉伸3 (add)
    with BuildSketch(Plane.XZ):
        with BuildLine():
            Line((17.5, 17.853571071), (17.5, 32.5))
            Line((17.5, 32.5), (-17.5, 32.5))
            Line((-17.5, 32.5), (-17.5, 17.853571071))
            ThreePointArc((-17.5, 17.853571071), (0, 25), (17.5, 17.853571071))
        make_face()
        with BuildLine():
            Line((17.5, -32.5), (-17.5, -32.5))
            Line((-17.5, -32.5), (-17.5, -17.853571071))
            ThreePointArc((-17.5, -17.853571071), (0, -25), (17.5, -17.853571071))
            Line((17.5, -17.853571071), (17.5, -32.5))
        make_face()
    extrude(amount=-EXTRUDE_3_DEPTH)

    # 草图13 → 凸台-拉伸4 (add)
    with BuildSketch(Plane(origin=(0, 5, 0), x_dir=(1, 0, 0), z_dir=(0, 1, 0))):
        with Locations((0, 30)):
            Rectangle(SKETCH_13_W, SKETCH_13_H)
        with Locations((0, -30)):
            Rectangle(SKETCH_13_W, SKETCH_13_H)
    extrude(amount=EXTRUDE_4_DEPTH)

    # 倒角1
    chamfer_1_edges = [part.edges().sort_by_distance(p)[0] for p in [
        (0, 5, -27.5),
        (0, 5, 27.5),
    ]]
    chamfer(chamfer_1_edges, length=CHAMFER_1_SIZE)

    # 切除-拉伸5 outline → 切除-拉伸5 (cut)
    with BuildSketch(Plane.XY.offset(32.5).offset(CUT_EXTRUDE_START_2)):
        with BuildLine():
            ThreePointArc((-5.944619841, 31.128972222), (-3.546948023, 33.9469404), (0, 35))
            Line((0, 35), (-17.5, 35))
            Line((-17.5, 35), (-17.5, 5))
            Line((-17.5, 5), (-5.944619841, 31.128972222))
        make_face()
        with BuildLine():
            Line((5.944619841, 31.128972222), (17.5, 5))
            Line((17.5, 5), (17.5, 35))
            Line((17.5, 35), (0, 35))
            ThreePointArc((0, 35), (3.546948023, 33.9469404), (5.944619841, 31.128972222))
        make_face()
        with Locations((0, 28.5)):
            Circle(CUT_EXTRUDE_5_OUTLINE_R)
        with Locations((0, 13.5)):
            Circle(CUT_EXTRUDE_5_OUTLINE_R_2)
    extrude(amount=CUT_EXTRUDE_5_DEPTH, mode=Mode.SUBTRACT)


solid = part.part
